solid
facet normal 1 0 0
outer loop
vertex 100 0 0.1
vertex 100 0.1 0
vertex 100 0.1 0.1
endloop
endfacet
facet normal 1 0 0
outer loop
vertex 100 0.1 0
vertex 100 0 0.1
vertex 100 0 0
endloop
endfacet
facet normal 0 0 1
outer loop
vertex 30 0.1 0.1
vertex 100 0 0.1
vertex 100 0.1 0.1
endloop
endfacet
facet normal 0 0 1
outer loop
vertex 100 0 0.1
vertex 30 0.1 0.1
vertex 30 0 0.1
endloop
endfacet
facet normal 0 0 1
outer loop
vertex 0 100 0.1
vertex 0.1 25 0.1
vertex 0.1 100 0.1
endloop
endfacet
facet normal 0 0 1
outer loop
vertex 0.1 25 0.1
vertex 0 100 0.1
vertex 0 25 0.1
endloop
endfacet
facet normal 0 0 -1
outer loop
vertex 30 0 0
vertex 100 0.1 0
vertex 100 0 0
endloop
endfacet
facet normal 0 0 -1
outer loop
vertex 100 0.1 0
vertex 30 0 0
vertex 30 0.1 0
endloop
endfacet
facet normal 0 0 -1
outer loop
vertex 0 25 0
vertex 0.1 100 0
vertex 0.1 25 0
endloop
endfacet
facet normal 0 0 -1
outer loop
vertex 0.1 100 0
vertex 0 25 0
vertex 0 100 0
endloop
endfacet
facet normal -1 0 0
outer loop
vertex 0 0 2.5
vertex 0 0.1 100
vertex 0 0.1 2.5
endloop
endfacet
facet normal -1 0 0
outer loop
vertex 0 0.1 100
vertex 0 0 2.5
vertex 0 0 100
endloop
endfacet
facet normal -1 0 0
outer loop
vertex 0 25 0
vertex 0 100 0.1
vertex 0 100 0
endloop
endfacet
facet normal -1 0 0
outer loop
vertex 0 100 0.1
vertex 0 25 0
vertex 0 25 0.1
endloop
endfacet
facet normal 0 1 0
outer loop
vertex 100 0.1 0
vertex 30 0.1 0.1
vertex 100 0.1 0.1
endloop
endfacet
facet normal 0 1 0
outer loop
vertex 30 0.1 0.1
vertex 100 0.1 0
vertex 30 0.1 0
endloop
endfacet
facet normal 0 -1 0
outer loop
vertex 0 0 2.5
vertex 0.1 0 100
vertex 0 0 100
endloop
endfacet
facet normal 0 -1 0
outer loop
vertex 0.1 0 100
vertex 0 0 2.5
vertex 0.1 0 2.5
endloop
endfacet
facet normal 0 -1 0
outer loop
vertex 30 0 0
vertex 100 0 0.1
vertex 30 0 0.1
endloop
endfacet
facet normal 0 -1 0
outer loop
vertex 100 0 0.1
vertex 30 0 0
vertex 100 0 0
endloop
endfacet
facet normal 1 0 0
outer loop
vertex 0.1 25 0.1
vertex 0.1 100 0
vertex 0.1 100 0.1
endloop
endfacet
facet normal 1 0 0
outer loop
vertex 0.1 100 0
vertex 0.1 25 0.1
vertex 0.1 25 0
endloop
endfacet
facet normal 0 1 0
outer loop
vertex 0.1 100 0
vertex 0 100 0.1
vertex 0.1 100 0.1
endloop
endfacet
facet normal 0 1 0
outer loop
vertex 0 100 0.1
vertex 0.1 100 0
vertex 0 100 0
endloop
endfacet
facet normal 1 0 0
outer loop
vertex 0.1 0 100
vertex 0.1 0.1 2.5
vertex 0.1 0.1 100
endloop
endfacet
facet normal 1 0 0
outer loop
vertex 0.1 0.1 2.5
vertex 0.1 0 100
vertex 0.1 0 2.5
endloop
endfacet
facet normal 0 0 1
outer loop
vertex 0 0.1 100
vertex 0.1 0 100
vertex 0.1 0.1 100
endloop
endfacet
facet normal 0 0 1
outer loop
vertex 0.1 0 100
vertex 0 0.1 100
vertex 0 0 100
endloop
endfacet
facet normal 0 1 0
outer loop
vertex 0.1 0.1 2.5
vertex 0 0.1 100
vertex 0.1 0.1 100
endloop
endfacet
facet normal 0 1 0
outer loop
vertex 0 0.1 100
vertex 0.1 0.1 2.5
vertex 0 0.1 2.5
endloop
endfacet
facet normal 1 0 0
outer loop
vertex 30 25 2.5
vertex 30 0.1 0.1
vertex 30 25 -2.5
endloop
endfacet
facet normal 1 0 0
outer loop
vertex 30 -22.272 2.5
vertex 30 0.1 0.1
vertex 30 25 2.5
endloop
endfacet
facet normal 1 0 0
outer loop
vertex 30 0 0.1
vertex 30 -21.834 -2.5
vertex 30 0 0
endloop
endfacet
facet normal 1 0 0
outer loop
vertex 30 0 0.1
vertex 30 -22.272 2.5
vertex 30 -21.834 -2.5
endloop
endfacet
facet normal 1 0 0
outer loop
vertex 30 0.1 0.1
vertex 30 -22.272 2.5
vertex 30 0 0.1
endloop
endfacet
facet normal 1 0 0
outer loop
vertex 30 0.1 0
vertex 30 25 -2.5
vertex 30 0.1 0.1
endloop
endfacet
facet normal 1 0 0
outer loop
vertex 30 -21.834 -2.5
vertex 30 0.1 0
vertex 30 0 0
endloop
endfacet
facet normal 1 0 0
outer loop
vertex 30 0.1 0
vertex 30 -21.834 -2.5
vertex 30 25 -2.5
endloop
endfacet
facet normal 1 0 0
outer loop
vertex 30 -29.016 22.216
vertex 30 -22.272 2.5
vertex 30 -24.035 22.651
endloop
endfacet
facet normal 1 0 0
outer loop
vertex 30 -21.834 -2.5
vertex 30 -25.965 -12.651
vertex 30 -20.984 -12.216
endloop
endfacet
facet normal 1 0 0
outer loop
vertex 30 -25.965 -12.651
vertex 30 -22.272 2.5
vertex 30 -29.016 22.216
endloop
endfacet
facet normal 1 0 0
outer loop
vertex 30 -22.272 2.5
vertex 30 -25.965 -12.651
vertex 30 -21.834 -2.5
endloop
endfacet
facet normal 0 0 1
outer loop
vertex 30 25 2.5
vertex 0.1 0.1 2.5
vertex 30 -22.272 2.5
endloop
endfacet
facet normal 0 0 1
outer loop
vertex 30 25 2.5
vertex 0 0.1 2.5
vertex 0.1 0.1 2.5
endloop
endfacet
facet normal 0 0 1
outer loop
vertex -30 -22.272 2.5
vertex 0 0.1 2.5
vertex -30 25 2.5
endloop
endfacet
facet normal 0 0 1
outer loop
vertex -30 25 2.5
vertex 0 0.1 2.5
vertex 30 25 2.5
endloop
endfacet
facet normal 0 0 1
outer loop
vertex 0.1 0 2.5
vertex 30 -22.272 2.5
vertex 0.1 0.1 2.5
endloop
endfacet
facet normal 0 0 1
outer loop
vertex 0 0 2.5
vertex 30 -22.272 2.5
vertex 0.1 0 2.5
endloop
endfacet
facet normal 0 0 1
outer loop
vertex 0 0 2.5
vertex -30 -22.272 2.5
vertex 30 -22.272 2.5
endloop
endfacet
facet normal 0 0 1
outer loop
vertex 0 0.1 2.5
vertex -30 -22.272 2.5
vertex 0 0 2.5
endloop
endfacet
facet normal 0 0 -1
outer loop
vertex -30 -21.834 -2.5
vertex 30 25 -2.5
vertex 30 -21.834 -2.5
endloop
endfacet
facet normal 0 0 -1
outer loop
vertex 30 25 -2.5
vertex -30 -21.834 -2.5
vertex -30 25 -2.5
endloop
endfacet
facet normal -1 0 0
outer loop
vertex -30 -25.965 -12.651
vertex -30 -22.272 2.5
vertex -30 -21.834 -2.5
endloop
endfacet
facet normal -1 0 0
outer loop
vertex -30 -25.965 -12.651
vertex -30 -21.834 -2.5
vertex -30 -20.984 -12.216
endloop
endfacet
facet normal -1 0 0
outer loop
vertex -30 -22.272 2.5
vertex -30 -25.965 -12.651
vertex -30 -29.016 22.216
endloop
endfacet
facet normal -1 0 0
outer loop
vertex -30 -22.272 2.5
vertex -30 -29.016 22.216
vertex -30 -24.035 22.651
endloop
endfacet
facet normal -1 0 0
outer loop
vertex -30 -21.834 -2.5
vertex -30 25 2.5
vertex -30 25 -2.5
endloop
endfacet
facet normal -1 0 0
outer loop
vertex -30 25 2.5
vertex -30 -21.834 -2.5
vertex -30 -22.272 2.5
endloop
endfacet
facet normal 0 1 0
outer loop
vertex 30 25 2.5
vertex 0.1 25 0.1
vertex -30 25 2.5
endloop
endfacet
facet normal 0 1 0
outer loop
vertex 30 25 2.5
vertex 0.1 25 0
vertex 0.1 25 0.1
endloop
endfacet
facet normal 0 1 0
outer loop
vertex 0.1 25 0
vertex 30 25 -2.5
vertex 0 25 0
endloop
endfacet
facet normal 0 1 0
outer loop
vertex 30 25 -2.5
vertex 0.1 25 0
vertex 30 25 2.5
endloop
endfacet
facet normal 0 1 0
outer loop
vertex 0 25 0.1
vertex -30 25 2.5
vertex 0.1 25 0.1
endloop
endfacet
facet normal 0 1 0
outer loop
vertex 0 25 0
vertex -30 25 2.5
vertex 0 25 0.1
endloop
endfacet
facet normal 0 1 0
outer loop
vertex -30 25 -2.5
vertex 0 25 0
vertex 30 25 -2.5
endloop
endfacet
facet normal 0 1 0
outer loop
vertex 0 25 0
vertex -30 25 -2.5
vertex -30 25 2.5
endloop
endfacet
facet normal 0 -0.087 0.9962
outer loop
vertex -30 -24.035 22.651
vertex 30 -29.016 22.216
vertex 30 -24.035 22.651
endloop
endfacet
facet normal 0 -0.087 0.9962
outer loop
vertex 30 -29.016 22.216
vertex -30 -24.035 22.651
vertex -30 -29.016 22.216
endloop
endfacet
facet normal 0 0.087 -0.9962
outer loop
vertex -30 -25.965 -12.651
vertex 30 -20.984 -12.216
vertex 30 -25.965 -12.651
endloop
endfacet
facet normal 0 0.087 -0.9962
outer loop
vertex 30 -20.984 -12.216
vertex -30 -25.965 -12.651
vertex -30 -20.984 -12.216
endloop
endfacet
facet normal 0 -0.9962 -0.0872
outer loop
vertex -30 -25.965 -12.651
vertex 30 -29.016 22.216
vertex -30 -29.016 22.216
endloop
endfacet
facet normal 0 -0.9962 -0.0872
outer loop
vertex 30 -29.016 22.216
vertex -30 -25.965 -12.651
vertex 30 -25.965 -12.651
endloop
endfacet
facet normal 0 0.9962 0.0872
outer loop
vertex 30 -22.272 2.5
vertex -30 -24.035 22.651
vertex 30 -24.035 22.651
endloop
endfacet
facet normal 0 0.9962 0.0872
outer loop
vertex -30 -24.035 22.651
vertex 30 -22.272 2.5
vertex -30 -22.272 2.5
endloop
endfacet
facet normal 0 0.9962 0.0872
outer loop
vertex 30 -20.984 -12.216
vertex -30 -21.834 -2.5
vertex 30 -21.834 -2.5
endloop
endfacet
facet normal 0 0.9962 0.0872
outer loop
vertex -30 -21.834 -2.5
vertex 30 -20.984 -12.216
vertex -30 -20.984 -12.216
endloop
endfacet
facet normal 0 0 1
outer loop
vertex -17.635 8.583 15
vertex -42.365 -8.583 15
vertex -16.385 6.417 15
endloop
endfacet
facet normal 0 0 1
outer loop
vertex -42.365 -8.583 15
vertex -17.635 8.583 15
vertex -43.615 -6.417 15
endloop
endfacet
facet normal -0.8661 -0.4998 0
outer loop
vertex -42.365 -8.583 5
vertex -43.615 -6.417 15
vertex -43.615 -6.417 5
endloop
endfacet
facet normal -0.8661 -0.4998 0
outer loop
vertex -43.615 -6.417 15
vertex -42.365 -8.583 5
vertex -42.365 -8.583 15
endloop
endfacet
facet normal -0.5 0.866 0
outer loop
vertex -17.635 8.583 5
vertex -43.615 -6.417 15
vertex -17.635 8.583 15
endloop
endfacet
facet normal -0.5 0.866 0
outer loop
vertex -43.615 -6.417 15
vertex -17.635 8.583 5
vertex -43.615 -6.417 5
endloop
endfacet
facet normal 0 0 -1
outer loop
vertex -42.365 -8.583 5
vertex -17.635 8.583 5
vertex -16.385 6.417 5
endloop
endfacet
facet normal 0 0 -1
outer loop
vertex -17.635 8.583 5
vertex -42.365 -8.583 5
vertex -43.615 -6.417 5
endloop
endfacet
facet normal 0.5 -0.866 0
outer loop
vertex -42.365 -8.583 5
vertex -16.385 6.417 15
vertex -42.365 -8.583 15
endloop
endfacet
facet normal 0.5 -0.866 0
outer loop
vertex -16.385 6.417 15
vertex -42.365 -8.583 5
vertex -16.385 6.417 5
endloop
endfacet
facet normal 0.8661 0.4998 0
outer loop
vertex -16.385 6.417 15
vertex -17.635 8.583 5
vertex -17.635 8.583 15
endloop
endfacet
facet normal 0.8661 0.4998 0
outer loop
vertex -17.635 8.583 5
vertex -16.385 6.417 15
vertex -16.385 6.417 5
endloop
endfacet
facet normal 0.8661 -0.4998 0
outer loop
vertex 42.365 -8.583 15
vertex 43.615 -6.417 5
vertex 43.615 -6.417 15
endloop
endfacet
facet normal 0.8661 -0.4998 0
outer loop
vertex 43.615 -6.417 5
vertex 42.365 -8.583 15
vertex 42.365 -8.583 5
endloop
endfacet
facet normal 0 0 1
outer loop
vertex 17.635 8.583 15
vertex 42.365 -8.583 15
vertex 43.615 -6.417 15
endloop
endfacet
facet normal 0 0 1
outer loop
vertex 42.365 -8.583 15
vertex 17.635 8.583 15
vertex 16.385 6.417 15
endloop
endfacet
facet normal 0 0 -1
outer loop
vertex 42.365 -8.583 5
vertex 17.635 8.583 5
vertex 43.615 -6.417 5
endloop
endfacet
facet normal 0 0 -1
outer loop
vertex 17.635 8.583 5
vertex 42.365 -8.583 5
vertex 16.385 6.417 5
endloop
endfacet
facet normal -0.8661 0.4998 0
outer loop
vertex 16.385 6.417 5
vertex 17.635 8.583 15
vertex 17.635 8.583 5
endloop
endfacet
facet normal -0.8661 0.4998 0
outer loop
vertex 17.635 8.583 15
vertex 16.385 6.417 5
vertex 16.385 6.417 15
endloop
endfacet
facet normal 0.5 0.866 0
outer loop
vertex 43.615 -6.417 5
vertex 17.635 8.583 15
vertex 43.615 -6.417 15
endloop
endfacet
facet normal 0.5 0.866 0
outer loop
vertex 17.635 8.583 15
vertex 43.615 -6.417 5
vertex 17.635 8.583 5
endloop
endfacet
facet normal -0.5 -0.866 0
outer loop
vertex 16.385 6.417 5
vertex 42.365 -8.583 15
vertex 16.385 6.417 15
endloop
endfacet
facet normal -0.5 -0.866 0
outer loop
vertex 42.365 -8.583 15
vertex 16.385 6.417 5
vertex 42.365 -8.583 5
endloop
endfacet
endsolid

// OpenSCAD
    // Combined Scene

    // Permanent Model
    
    // Permanent Model (Black)
    color([0, 0, 0]) {
        // Your permanent model code here
        cube([100,0.1,0.1], center = false);
        cube([0.1,100,0.1], center = false);
        cube([0.1,0.1,100], center = false);
    }
    

    // Dynamic Model
    translate([0, 0, 0]) {
    // Chair Seat
    difference() {
        cube([60, 50, 5], center=true);
    }
    
    // Chair Backrest
    translate([0, -25, 5])
        rotate([5, 0, 0])
        cube([60, 5, 35], center=true);
    
    // Stylish Armrests
    translate([-30, 0, 10])
        rotate([0, 0, 30])
        scale([1, 0.5, 1])
        cube([30, 5, 10], center=true);
    translate([30, 0, 10])
        rotate([0, 0, -30])
        scale([1, 0.5, 1])
        cube([30, 5, 10], center=true);
    
    // Tapered Chair Legs
    for (x = [-20, 20]) {
        for (y = [-20, 20]) {
            translate([x, y, -10])
                linear_extrude(height=15) {
                    polygon(points=[[0, 0], [5, -10], [3, -10], [8, 0]]);
                }
        }
    }
}
    
